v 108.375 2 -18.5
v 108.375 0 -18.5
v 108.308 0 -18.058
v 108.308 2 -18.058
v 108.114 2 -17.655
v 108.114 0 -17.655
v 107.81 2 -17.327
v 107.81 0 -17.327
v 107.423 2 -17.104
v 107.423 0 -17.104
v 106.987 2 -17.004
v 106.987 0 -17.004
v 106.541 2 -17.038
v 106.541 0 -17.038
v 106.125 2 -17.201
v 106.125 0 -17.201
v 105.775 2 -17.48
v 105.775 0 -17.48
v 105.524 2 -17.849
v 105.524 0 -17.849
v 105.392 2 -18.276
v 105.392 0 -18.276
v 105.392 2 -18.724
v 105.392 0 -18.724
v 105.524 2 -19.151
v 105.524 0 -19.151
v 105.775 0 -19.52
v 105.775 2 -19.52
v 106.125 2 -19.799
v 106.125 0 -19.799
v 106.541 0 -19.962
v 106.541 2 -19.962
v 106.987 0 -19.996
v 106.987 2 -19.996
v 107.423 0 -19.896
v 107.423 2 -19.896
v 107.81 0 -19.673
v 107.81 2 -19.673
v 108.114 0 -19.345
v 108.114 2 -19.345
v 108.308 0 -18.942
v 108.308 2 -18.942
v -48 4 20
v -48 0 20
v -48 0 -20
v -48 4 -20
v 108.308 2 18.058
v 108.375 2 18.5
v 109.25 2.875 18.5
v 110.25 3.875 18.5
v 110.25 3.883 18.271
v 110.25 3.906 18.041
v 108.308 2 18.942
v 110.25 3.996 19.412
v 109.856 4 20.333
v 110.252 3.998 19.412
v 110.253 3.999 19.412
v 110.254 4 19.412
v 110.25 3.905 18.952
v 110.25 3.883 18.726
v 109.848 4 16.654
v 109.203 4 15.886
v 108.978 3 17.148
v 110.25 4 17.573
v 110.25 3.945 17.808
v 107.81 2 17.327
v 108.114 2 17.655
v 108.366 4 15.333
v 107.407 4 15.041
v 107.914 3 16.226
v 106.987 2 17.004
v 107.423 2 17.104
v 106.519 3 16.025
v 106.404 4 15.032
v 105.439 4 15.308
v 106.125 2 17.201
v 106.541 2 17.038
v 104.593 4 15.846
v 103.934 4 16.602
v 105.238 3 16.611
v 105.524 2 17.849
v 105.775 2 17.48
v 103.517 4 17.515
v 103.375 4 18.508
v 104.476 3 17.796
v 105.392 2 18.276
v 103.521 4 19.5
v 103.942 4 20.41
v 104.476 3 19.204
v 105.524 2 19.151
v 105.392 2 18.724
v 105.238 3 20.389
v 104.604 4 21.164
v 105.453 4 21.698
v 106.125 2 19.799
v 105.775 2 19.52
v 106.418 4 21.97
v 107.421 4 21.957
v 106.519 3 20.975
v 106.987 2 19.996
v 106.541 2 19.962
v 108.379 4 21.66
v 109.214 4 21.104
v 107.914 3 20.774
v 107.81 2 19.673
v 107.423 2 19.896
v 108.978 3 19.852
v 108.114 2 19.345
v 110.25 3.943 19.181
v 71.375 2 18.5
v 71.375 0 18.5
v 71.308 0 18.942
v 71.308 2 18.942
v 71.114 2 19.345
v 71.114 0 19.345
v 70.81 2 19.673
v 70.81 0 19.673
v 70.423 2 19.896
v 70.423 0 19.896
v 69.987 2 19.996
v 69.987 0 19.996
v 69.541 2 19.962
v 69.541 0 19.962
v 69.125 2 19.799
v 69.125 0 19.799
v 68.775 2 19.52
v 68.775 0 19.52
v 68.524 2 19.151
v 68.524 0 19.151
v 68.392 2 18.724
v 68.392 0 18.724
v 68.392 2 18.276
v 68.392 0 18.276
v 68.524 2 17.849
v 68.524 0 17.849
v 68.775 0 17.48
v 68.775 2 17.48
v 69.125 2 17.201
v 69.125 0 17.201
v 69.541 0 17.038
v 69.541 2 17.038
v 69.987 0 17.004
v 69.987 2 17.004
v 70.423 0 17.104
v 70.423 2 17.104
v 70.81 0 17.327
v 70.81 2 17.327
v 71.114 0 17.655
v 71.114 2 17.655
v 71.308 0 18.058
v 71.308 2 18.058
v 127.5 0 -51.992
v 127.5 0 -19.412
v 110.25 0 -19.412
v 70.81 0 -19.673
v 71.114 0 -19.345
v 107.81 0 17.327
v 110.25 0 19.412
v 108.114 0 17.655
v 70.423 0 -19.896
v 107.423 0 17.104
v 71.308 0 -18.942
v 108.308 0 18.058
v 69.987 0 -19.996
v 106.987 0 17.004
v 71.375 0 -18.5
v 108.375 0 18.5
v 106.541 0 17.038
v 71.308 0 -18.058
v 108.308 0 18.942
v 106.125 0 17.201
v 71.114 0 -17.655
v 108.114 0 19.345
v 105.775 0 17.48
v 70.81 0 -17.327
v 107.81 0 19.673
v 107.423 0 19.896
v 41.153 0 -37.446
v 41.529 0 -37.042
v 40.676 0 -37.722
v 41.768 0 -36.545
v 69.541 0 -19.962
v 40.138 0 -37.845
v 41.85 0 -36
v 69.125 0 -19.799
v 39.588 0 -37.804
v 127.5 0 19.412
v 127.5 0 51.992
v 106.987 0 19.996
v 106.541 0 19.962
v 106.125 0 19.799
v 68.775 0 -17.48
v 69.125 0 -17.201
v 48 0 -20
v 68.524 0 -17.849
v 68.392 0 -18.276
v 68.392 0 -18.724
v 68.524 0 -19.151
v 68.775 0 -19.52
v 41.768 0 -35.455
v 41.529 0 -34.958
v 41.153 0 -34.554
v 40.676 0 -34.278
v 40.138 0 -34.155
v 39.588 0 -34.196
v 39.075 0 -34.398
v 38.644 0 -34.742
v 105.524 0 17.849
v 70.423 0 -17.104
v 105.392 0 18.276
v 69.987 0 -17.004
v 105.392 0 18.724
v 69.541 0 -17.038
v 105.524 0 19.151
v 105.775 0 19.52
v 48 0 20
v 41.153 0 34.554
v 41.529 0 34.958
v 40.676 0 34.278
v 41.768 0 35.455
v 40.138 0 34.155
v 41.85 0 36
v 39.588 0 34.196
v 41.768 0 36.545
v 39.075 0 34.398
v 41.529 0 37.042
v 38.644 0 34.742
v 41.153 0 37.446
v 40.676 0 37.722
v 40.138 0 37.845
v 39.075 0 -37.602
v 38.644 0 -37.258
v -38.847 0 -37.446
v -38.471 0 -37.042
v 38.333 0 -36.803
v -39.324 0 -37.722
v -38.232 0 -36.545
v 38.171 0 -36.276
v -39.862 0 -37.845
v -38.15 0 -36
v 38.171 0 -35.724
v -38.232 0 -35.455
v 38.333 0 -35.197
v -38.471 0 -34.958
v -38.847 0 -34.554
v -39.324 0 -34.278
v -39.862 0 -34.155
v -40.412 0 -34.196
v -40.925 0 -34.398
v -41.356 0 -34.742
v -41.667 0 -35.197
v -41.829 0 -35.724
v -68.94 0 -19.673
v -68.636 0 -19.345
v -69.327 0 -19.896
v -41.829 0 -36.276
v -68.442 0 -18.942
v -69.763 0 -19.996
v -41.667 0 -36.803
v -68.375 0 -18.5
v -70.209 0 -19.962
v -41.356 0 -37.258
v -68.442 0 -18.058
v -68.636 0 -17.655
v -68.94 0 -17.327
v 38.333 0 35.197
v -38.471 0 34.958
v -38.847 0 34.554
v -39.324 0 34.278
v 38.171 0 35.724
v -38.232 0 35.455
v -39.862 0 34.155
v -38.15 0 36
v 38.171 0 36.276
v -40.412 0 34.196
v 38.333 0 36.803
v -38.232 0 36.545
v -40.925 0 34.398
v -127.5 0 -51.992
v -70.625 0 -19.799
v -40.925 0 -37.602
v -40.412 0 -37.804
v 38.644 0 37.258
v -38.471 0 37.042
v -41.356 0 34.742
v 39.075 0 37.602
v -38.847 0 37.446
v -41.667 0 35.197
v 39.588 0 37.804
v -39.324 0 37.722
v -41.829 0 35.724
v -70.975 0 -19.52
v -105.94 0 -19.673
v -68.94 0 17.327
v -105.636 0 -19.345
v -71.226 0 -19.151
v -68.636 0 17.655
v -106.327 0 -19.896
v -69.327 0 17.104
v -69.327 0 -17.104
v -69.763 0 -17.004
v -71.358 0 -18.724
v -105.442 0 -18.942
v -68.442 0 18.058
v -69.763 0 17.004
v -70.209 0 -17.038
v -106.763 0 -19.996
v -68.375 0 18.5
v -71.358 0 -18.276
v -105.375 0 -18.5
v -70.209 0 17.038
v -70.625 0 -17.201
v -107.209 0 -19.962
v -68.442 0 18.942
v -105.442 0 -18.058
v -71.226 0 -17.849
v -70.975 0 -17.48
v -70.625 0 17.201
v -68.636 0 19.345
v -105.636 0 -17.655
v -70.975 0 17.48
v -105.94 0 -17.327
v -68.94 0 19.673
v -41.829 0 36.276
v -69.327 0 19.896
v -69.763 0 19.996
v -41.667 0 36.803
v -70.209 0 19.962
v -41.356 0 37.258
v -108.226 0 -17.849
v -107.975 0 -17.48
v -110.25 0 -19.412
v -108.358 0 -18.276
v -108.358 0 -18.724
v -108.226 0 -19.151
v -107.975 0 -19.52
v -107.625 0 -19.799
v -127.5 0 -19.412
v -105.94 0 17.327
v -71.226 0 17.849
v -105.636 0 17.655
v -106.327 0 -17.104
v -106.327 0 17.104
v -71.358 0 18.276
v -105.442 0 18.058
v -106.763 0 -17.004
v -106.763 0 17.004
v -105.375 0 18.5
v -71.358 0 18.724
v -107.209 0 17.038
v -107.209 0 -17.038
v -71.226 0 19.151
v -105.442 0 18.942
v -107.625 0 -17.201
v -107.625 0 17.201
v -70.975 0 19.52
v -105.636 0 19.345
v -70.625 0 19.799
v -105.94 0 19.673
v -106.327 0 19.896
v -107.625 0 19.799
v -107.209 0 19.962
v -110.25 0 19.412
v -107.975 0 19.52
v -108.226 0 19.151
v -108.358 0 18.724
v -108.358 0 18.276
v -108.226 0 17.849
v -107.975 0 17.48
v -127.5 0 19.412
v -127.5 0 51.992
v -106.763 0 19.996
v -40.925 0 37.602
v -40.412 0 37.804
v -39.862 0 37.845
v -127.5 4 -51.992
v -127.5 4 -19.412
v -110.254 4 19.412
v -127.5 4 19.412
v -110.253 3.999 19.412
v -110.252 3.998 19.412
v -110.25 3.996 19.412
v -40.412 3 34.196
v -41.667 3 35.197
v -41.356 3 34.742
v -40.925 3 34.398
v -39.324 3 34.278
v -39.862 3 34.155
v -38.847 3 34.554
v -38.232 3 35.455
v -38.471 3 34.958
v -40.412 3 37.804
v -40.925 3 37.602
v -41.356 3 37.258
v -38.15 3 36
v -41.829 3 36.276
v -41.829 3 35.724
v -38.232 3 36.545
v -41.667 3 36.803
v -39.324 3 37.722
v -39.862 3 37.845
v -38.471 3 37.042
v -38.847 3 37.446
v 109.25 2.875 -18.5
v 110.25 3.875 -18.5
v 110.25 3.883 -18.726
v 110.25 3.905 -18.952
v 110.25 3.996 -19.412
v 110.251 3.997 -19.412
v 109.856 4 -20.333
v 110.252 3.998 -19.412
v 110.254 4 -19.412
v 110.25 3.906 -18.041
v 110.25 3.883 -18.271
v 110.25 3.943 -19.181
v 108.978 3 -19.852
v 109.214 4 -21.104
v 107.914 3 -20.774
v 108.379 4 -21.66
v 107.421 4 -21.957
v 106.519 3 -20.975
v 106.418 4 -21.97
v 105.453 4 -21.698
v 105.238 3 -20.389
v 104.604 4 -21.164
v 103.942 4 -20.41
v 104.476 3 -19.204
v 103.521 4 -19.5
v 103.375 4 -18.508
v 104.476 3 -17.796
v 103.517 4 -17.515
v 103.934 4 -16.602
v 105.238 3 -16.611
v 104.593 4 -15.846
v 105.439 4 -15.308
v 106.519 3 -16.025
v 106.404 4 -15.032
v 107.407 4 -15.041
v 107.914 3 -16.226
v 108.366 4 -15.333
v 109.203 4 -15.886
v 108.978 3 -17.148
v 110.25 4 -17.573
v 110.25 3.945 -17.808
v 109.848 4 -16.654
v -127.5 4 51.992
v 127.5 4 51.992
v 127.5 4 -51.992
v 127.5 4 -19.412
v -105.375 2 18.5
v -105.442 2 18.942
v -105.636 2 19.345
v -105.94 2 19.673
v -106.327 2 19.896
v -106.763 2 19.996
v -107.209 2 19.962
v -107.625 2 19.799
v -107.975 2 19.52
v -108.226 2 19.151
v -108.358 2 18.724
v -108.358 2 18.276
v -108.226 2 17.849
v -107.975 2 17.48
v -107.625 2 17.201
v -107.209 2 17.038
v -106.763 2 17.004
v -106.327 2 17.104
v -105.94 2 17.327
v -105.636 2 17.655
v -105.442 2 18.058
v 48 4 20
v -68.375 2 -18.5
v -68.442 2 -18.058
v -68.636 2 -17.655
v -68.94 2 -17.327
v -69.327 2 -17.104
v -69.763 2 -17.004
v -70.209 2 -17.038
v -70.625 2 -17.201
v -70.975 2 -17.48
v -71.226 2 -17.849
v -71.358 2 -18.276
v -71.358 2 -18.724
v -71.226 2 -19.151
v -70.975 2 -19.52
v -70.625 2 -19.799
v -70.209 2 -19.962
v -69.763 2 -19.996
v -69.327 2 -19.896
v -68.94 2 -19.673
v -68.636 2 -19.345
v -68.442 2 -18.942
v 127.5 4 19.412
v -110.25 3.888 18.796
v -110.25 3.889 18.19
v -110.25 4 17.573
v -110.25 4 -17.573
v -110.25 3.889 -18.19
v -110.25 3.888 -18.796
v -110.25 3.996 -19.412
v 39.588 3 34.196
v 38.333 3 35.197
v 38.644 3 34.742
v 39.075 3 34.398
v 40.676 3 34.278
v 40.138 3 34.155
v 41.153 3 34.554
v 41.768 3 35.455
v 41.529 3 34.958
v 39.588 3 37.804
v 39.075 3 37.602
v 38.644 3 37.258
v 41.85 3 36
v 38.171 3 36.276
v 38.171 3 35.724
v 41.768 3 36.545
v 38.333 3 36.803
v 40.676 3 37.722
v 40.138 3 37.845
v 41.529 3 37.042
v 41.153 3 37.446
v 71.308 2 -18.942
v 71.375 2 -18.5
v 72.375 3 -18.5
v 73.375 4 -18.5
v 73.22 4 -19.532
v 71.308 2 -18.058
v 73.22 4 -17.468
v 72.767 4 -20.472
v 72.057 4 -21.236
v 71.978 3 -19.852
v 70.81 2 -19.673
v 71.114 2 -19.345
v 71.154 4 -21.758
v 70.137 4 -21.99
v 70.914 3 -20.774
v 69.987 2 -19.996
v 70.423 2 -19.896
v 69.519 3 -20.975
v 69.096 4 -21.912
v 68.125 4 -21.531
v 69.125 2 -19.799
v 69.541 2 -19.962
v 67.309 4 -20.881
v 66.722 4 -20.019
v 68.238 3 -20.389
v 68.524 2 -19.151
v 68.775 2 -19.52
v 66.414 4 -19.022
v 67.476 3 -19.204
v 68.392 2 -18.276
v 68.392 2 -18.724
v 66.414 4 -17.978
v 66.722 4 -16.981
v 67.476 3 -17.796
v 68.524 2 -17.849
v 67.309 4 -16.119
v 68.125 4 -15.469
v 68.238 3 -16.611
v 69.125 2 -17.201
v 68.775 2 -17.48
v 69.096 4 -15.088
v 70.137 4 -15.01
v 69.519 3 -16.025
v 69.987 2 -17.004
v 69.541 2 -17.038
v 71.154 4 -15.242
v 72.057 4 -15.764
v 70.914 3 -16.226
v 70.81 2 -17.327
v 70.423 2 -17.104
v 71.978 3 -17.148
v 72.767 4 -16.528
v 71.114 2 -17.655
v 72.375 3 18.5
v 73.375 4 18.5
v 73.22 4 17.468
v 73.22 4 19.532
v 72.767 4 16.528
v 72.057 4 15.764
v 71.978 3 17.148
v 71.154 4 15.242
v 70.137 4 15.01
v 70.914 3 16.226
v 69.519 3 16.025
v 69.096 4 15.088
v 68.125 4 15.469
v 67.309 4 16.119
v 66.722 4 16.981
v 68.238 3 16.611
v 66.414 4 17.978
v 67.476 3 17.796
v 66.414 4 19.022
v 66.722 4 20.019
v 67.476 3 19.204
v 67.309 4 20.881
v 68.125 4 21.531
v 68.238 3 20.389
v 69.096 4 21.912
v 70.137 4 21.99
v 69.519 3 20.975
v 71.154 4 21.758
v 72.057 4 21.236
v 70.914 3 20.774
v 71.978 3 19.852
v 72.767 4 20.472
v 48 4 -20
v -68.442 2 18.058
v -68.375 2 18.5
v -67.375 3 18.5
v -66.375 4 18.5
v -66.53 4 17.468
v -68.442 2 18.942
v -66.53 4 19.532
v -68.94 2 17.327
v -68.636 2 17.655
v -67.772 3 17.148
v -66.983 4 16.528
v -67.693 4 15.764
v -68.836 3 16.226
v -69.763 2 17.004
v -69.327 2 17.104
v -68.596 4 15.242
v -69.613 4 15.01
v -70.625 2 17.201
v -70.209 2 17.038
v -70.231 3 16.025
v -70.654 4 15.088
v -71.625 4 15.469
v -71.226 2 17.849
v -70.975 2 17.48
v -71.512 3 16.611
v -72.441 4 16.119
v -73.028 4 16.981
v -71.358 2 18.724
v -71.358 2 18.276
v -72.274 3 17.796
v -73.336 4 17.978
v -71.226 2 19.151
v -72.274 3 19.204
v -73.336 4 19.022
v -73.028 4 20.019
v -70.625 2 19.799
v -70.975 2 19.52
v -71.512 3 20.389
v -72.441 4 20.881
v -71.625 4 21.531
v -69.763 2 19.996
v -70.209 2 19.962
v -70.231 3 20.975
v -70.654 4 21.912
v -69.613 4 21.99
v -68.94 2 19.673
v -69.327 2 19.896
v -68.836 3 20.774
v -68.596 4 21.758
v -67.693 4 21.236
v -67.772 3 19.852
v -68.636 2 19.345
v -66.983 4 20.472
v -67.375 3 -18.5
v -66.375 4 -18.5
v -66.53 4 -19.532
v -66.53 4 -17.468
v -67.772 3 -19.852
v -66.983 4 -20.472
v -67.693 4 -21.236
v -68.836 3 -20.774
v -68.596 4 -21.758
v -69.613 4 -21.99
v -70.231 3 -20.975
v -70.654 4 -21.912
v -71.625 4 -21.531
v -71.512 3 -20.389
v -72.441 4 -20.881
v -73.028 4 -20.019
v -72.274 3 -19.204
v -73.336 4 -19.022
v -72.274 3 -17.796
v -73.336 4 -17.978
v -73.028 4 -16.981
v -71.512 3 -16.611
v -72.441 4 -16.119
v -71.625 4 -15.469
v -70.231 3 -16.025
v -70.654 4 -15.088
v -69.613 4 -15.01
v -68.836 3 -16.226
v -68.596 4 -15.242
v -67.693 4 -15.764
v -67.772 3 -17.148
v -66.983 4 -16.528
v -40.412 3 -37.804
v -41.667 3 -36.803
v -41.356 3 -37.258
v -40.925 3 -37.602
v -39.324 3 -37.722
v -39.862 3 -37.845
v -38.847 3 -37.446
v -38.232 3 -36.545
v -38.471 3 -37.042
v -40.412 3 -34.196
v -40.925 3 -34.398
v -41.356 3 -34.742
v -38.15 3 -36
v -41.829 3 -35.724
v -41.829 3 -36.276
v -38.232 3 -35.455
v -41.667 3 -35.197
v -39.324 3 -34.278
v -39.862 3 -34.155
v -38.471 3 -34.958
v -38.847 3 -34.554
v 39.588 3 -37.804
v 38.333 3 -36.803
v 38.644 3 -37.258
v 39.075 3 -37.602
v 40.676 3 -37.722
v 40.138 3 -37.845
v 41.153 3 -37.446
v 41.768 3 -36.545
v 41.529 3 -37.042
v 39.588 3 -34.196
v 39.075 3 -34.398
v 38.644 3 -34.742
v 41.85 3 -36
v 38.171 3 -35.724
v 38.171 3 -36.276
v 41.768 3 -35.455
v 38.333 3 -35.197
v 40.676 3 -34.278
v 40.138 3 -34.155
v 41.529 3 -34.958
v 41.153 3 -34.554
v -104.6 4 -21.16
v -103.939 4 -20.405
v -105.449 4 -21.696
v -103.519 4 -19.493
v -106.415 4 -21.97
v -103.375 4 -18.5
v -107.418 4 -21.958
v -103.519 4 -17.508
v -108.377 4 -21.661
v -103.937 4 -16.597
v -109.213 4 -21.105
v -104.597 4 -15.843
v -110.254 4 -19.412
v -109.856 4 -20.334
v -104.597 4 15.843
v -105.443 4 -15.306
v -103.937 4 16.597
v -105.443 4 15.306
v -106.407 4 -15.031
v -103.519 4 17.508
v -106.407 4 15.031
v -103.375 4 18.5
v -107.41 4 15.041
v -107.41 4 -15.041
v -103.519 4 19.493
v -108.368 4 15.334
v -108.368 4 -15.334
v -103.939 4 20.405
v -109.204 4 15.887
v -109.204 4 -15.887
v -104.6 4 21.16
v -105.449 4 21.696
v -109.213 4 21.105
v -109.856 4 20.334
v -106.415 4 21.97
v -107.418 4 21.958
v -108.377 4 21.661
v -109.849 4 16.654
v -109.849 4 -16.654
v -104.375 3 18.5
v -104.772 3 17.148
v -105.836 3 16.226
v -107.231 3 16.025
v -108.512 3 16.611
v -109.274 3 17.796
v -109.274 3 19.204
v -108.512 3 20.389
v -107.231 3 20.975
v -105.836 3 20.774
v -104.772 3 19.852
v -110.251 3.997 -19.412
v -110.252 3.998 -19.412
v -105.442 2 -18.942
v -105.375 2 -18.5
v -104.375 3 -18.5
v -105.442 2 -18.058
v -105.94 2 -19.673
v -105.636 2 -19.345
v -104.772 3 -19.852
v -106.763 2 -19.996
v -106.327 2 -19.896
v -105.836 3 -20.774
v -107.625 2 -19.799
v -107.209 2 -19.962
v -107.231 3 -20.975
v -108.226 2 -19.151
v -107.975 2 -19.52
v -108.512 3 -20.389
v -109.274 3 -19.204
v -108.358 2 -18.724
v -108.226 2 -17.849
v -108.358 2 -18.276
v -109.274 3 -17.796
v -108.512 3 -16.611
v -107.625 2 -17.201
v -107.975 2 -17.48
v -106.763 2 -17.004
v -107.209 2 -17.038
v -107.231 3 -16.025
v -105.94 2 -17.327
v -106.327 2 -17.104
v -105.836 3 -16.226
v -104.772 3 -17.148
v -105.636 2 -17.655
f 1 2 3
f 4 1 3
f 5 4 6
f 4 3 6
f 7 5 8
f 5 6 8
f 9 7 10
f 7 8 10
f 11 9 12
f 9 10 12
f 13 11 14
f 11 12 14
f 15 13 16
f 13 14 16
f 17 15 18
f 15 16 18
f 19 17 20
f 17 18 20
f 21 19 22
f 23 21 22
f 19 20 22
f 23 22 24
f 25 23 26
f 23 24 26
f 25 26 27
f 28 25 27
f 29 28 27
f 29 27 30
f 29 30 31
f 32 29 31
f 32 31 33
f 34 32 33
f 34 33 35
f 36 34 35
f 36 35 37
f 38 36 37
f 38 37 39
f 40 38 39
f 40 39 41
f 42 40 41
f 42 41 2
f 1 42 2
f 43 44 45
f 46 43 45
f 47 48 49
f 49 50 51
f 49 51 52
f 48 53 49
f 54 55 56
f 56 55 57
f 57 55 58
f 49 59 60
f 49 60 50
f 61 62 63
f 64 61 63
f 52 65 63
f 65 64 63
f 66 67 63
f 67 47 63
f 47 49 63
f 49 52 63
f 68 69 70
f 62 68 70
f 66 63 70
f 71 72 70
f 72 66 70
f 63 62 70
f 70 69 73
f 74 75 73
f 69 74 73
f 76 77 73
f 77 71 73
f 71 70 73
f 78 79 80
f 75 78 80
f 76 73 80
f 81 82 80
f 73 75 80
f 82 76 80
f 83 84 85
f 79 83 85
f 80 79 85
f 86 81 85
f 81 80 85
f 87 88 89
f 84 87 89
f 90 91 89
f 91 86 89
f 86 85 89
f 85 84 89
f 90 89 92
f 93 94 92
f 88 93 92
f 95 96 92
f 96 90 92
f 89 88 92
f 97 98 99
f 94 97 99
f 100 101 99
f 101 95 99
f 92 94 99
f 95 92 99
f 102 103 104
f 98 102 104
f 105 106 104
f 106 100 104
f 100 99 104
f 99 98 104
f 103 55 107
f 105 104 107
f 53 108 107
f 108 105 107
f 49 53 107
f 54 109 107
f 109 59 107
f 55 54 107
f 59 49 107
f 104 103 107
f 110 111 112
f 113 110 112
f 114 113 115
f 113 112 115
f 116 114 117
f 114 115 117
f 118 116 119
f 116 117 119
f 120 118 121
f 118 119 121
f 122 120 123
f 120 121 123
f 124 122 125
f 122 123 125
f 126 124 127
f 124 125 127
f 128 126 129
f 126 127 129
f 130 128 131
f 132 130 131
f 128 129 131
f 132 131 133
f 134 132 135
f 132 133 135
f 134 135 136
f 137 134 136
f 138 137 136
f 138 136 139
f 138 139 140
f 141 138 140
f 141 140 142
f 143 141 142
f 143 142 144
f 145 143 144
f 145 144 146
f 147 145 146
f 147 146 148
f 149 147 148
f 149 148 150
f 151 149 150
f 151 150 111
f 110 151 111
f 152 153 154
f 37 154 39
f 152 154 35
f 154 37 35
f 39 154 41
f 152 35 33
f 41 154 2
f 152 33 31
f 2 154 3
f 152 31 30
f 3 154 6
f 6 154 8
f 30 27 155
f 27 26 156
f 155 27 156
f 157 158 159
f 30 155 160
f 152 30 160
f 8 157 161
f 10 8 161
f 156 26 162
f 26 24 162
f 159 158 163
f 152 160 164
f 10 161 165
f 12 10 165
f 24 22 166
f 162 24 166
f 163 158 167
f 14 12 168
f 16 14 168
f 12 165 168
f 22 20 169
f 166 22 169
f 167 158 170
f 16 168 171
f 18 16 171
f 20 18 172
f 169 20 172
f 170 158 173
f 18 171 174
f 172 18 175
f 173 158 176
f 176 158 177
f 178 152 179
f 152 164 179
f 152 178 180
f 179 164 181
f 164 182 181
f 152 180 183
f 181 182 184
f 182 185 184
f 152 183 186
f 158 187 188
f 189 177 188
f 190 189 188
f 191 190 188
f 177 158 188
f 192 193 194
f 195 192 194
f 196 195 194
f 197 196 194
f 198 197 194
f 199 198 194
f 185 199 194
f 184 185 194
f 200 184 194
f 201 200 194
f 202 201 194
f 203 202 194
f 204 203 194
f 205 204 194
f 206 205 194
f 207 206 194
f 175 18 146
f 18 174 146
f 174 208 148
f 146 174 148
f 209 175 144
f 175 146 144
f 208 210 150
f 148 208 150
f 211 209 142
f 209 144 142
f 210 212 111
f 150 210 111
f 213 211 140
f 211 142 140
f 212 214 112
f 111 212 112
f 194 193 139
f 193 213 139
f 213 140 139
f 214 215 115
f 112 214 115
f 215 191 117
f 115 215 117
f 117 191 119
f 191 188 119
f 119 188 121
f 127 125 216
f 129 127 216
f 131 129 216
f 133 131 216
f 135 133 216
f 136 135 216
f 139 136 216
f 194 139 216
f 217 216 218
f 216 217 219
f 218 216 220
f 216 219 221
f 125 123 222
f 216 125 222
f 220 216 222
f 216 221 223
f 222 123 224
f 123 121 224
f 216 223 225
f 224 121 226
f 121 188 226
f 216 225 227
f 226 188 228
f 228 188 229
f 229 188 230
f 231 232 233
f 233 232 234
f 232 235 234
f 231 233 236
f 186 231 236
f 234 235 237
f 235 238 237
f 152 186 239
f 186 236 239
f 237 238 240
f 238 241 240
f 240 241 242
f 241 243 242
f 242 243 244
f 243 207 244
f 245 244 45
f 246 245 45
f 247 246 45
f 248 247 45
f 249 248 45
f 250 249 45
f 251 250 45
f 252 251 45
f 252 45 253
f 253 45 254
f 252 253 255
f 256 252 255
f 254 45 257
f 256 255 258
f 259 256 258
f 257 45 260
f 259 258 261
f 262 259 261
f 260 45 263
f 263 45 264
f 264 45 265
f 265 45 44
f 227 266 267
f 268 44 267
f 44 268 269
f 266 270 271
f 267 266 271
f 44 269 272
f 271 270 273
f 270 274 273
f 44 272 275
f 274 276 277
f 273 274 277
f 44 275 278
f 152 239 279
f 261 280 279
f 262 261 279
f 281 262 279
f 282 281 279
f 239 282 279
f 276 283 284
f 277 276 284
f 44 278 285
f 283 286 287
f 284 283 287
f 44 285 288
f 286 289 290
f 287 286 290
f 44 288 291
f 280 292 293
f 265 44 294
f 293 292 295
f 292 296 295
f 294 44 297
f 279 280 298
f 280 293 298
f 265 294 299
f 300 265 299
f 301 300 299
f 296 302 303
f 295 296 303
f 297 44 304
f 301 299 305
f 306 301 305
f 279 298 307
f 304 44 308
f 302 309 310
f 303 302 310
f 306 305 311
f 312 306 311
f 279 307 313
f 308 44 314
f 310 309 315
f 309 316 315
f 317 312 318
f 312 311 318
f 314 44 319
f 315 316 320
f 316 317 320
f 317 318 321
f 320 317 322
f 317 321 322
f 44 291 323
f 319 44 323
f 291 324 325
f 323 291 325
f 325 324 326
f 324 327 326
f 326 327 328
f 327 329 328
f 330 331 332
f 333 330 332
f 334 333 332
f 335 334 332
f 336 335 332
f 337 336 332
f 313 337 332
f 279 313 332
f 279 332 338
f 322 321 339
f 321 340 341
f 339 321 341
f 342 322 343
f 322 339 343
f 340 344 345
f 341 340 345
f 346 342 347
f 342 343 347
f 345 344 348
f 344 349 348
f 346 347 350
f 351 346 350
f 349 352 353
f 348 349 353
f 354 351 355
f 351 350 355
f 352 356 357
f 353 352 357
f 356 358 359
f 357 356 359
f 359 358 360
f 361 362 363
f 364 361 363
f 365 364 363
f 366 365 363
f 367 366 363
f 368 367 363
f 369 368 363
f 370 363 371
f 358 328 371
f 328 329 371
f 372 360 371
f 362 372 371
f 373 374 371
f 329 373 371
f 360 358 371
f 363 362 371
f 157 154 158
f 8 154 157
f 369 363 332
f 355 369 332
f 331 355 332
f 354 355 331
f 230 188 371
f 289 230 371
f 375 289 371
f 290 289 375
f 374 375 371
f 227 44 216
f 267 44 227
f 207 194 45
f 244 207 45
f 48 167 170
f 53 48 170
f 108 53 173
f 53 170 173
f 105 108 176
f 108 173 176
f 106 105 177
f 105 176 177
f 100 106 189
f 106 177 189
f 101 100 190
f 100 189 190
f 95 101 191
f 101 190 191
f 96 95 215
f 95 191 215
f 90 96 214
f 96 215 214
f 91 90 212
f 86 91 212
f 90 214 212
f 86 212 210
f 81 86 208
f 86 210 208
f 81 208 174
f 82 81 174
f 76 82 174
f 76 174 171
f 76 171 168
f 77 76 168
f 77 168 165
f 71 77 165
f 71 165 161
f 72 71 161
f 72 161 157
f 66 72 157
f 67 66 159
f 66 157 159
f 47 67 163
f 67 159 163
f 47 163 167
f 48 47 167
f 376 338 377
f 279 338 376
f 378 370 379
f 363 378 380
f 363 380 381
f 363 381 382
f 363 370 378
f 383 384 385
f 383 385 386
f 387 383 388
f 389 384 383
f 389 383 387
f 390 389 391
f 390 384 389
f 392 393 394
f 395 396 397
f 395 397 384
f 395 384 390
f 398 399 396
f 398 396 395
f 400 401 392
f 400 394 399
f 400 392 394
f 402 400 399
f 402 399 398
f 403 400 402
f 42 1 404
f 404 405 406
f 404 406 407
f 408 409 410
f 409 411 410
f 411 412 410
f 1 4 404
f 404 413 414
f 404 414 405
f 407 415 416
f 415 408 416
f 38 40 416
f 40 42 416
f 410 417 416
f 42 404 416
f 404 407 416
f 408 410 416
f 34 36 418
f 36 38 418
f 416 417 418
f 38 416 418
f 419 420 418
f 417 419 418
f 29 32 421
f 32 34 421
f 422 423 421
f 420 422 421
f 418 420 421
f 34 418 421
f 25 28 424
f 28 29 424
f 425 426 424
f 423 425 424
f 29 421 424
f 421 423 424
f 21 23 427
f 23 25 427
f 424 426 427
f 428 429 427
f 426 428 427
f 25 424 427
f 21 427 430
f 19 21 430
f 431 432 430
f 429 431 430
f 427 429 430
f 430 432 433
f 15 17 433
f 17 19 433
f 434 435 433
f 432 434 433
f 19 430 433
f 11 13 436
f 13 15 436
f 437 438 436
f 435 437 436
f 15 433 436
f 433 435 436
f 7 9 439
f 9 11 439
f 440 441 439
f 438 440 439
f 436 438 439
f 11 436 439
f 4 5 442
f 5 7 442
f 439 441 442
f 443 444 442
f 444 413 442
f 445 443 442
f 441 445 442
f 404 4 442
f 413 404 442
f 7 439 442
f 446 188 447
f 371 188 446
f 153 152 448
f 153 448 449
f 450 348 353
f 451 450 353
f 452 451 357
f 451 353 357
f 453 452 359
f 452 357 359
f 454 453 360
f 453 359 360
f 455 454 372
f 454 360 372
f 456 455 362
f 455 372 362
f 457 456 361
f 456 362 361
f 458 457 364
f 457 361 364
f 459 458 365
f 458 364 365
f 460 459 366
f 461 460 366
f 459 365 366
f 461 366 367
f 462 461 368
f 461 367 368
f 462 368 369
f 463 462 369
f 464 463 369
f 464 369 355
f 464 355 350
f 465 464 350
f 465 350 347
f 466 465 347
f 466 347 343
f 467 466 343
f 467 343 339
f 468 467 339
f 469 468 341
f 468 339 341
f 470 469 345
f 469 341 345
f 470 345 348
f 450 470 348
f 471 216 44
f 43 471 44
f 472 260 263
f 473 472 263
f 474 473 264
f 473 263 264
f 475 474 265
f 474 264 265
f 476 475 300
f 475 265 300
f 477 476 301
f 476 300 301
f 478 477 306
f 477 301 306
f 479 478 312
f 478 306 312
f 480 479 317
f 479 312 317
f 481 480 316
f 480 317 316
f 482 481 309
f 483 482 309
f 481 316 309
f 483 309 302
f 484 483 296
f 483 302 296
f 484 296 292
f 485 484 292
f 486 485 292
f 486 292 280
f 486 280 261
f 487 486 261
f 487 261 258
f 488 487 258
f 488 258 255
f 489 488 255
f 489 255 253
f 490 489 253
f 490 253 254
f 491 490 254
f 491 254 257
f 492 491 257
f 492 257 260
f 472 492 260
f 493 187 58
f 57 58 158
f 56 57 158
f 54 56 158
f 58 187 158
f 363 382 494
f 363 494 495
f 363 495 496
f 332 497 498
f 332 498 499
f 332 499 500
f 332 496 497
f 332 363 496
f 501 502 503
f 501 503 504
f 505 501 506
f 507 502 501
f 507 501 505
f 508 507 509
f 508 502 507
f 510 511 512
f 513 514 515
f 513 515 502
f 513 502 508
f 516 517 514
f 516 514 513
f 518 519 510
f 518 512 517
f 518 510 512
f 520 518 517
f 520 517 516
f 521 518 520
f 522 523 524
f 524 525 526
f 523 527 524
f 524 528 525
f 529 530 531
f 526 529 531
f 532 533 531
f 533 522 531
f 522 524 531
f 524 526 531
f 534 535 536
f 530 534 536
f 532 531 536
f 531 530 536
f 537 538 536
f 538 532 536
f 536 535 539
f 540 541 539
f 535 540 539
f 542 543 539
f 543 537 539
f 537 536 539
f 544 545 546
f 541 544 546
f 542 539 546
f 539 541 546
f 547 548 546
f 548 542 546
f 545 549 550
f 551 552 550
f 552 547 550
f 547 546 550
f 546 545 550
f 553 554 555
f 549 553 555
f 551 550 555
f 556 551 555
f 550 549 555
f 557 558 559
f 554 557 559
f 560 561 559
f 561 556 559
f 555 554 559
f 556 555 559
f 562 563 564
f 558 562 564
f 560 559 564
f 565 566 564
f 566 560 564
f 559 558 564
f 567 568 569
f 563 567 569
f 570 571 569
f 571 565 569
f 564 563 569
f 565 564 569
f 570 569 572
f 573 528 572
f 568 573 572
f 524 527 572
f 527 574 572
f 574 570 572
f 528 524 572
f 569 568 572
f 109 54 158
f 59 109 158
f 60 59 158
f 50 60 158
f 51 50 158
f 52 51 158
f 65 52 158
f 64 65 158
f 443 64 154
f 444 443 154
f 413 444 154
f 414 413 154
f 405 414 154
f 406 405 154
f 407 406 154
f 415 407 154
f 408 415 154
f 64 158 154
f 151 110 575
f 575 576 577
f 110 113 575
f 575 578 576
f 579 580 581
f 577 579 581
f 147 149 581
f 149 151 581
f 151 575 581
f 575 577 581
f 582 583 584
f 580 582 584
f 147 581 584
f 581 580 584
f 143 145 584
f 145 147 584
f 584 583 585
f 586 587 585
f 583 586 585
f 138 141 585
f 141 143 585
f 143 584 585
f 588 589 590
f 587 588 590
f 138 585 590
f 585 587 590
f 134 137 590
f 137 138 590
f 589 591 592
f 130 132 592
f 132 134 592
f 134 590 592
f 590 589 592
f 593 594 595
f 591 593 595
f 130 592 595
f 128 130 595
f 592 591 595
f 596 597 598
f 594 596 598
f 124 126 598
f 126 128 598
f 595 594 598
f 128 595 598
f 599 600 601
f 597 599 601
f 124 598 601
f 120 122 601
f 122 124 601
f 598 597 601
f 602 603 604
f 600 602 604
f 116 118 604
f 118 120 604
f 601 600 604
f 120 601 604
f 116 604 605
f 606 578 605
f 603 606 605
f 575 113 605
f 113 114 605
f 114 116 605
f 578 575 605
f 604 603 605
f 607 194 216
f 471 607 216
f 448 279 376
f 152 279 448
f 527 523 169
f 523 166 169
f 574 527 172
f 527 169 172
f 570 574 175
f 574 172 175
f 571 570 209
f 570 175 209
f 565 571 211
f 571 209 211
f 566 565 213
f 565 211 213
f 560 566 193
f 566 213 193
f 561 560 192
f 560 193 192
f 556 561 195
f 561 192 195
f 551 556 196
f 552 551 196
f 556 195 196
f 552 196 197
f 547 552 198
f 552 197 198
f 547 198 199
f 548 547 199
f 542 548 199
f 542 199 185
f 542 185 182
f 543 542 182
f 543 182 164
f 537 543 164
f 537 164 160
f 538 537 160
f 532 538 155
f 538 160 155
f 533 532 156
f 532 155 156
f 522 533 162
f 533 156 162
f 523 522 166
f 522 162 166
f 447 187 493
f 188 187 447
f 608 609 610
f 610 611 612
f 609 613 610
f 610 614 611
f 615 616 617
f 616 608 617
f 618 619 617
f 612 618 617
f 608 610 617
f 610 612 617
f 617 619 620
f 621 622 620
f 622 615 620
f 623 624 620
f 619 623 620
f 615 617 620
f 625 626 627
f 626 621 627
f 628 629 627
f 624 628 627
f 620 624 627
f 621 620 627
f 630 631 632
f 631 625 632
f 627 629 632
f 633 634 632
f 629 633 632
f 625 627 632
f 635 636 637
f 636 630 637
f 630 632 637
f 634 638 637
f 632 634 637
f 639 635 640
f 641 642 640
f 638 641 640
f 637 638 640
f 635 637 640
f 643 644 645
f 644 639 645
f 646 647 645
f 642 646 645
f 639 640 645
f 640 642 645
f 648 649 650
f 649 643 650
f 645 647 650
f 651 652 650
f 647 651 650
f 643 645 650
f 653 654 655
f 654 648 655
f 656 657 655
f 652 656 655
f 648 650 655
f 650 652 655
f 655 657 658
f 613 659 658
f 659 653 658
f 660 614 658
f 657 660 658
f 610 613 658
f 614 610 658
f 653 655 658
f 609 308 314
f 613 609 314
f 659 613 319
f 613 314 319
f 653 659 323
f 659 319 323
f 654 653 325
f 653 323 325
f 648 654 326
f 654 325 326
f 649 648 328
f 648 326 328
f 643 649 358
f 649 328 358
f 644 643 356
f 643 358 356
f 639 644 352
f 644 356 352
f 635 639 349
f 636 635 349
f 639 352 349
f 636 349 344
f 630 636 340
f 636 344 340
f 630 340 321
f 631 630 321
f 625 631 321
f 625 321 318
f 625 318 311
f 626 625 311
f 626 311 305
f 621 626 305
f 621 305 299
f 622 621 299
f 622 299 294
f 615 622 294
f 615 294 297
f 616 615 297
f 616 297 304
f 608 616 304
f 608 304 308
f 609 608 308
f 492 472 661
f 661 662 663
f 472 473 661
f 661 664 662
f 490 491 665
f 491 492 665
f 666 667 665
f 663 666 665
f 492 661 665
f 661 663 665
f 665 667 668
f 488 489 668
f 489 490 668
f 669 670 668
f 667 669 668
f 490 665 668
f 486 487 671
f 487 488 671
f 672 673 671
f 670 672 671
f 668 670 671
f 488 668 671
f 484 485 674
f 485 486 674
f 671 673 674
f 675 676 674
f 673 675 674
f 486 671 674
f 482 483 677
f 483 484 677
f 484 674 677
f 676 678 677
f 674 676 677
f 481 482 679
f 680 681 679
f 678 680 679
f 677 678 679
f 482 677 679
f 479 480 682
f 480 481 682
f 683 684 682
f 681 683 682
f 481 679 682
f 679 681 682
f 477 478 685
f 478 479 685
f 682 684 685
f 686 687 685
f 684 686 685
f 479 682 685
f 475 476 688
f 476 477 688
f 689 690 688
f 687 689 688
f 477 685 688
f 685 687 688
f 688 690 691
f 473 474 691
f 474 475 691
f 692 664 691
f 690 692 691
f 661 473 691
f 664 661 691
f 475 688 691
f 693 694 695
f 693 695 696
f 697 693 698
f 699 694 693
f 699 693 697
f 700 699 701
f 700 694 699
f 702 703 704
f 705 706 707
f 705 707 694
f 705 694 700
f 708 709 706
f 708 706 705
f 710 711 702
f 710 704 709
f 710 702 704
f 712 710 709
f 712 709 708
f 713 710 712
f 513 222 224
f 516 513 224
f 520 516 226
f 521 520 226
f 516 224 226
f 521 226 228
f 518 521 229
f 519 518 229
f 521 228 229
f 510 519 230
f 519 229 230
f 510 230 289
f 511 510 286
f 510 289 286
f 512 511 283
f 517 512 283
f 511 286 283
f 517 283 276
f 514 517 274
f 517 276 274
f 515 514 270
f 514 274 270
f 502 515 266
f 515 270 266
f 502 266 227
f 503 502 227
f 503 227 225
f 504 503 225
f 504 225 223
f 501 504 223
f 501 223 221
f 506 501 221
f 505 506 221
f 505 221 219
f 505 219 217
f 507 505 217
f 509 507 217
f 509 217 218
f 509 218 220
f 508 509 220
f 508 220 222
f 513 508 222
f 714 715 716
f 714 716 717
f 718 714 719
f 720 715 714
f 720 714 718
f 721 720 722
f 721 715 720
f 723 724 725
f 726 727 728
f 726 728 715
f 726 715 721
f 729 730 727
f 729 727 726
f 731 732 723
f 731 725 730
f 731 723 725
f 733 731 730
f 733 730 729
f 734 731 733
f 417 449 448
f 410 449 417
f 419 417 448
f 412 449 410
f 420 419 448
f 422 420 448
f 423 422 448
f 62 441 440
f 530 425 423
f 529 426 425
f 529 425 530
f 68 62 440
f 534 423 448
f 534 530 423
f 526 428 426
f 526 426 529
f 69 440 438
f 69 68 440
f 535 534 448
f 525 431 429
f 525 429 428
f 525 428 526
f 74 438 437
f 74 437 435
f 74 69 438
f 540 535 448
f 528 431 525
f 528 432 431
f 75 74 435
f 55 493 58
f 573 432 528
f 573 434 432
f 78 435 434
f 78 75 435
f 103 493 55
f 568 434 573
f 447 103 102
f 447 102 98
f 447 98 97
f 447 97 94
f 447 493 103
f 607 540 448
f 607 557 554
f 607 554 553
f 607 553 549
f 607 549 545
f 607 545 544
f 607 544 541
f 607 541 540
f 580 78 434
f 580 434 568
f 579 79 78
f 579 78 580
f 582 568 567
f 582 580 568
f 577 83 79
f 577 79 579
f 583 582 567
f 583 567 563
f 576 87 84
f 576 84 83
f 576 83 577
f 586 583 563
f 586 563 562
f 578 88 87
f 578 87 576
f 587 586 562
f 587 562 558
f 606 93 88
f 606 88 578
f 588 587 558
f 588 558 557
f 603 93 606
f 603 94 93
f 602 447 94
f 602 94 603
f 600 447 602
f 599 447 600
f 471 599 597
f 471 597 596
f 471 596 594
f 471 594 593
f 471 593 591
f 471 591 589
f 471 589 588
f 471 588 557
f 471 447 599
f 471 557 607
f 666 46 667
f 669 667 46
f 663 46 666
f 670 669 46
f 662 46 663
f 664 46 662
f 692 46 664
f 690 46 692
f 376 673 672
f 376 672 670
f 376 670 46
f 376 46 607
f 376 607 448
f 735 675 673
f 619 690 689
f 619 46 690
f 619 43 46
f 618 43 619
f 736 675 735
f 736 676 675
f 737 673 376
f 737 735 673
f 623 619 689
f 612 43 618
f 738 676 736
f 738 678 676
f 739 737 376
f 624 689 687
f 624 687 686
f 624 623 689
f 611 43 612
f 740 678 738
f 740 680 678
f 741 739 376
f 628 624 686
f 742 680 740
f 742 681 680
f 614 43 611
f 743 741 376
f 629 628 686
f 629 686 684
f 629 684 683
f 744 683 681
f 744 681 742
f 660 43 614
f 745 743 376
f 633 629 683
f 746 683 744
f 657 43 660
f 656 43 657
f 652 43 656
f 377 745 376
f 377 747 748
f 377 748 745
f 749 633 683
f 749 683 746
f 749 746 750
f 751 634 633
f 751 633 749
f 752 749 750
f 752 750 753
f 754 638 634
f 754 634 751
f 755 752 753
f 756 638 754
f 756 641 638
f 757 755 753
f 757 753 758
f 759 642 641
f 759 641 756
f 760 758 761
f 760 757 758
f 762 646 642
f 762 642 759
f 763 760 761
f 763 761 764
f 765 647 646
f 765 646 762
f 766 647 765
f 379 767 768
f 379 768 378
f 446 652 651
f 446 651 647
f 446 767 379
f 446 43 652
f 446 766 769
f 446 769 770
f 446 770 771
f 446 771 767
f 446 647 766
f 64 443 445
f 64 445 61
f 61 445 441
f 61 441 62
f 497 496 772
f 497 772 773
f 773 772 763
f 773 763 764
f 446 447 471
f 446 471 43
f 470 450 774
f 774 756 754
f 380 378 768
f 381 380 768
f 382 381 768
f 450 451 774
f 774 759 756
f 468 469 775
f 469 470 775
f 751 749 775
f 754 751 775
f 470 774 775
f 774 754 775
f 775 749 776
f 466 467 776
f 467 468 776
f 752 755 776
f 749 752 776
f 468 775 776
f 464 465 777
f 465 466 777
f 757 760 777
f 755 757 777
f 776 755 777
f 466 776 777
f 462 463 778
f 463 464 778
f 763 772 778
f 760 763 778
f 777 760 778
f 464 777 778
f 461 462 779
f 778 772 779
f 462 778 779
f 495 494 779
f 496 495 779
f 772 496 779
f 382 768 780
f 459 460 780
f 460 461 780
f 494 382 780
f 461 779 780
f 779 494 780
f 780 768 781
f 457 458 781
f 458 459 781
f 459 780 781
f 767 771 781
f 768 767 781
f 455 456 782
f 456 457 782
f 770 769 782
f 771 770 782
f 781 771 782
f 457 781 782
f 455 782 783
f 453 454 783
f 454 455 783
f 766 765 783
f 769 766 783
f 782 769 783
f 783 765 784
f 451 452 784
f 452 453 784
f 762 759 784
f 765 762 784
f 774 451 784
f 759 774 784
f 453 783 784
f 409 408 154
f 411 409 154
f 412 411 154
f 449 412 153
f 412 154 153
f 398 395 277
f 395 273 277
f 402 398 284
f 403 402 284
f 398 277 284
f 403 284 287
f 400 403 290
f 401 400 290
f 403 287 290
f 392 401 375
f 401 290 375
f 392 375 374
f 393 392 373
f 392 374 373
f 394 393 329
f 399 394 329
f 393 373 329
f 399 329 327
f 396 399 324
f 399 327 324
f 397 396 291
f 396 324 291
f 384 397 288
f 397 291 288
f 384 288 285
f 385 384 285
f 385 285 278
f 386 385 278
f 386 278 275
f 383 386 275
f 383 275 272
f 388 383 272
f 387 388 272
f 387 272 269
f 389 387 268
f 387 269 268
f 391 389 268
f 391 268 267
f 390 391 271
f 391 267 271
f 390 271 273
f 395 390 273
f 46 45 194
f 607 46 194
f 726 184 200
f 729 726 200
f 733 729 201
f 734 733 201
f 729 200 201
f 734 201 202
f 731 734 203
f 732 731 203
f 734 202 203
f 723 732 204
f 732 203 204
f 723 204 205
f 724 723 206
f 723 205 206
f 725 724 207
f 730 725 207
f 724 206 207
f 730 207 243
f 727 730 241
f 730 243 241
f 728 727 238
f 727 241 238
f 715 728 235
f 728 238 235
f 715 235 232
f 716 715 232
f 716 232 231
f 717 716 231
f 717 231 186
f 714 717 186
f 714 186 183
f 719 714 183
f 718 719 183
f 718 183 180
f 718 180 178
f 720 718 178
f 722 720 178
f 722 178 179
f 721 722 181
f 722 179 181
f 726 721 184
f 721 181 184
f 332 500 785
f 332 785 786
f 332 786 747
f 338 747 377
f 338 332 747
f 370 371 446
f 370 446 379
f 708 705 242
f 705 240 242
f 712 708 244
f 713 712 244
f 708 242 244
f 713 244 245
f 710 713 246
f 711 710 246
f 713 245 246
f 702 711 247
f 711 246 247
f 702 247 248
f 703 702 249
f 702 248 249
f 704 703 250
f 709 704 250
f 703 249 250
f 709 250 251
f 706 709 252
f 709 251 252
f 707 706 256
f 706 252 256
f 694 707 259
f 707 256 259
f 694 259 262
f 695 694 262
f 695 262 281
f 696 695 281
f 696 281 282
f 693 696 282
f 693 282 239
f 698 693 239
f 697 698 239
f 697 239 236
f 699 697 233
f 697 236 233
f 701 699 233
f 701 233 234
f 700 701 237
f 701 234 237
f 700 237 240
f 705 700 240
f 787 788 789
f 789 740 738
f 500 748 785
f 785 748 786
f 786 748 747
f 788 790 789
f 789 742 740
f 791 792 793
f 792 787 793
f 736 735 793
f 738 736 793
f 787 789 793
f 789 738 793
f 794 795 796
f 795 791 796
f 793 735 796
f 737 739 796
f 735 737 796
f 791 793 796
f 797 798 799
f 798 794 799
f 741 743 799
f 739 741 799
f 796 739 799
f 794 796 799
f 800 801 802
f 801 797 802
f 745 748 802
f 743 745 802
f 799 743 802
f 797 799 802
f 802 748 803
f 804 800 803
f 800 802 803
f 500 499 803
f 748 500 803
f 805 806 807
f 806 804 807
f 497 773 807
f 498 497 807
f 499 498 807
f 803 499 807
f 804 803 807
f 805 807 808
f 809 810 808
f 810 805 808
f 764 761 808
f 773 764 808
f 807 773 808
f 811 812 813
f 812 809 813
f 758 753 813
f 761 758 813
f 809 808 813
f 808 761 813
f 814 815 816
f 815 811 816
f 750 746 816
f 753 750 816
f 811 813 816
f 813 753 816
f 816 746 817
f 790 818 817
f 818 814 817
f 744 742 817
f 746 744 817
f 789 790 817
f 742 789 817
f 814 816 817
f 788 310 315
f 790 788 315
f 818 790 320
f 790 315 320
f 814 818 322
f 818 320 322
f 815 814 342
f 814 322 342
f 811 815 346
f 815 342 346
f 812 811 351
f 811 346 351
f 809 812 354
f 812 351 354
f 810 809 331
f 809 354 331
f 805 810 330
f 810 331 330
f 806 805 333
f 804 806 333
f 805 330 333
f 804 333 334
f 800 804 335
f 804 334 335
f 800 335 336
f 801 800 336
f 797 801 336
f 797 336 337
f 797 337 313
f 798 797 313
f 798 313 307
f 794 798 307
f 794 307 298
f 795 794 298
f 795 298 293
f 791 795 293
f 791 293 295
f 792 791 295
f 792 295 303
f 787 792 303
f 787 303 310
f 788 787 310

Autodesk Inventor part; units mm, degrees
ref_plane "YZ Plane" through (0, 0, 0) normal (1, 0, 0) x (0, 1, 0)
ref_plane "XZ Plane" through (0, 0, 0) normal (0, 1, 0) x (-1, 0, 0)
ref_plane "XY Plane" through (0, 0, 0) normal (0, 0, 1) x (1, 0, 0)
sketch "Эскиз1" plane through (0, 0, 0) normal (0, 1, 0) x (-1, 0, 0)
  line L0 (-127.5, 51.9915) -> (127.5, 51.9915)
  line L1 (127.5, 51.9915) -> (127.5, -51.9915)
  line L2 (127.5, -51.9915) -> (-127.5, -51.9915)
  line L3 (-127.5, -51.9915) -> (-127.5, 51.9915)
  line L4 (-48, 20) -> (48, 20)
  line L5 (48, 20) -> (48, -20)
  line L6 (48, -20) -> (-48, -20)
  line L7 (-48, -20) -> (-48, 20)
  line L8 (-48, 20) -> (48, -20) construction
  line L9 (48, 20) -> (-48, -20) construction
  line L10 (127.5, 19.4125) -> (110.25, 19.4125)
  line L11 (110.25, 19.4125) -> (110.25, -19.4125)
  line L12 (110.25, -19.4125) -> (127.5, -19.4125)
  line L13 (127.5, -19.4125) -> (127.5, 19.4125)
  line L14 (48, 0) -> (57.4345, 0)
  line L15 (0, 0) -> (0, -38.2708)
  line L16 (-127.5, 19.4125) -> (-110.25, 19.4125)
  line L17 (-110.25, 19.4125) -> (-110.25, -19.4125)
  line L18 (-110.25, -19.4125) -> (-127.5, -19.4125)
  line L19 (-127.5, -19.4125) -> (-127.5, 19.4125)
  dimension "d0" = 103.983
  dimension "d1" = 255
  dimension "d2" = 96
  dimension "d3" = 40
  dimension "d4" = 38.825
  dimension "d5" = 17.25
extrude "Выдавливание1" add sketch "Эскиз1" along normal blind 4 contours L0 L1 L10 L11 L12 L2 L3 L18 L17 L16
sketch "Эскиз2" plane through (0, 0, 0) normal (0, -1, 0) x (1, 0, 0)
  circle A0 centre (40, 36) radius 1.85 projected
  circle A1 centre (40, -36) radius 1.85 projected
  circle A2 centre (-40, -36) radius 1.85 projected
  circle A3 centre (-40, 36) radius 1.85 projected
  point P0 (0, 0)
extrude "Выдавливание2" cut sketch "Эскиз2" against normal blind 3
sketch "Эскиз3" plane through (0, 0, 0) normal (0, -1, 0) x (1, 0, 0)
  circle A0 centre (-106.875, 18.5) radius 1.5 projected
  circle A1 centre (-69.875, 18.5) radius 1.5 projected
  circle A2 centre (-106.875, -18.5) radius 1.5 projected
  circle A3 centre (-69.875, -18.5) radius 1.5 projected
  circle A4 centre (69.875, -18.5) radius 1.5 projected
  circle A5 centre (69.875, 18.5) radius 1.5 projected
  circle A6 centre (106.875, 18.5) radius 1.5 projected
  circle A7 centre (106.875, -18.5) radius 1.5 projected
  point P0 (0, 0)
extrude "Выдавливание3" cut sketch "Эскиз3" against normal blind 4
chamfer "Фаска1" distance 2 angle 45 8 edges at (-108.375, 4, 18.5) (-71.375, 4, 18.5) (-71.375, 4, -18.5) (-108.375, 4, -18.5) (68.375, 4, -18.5) (68.375, 4, 18.5) (105.375, 4, 18.5) (105.375, 4, -18.5)
properties part number "KB33-046-004-019 - Площадка под драйверы"
